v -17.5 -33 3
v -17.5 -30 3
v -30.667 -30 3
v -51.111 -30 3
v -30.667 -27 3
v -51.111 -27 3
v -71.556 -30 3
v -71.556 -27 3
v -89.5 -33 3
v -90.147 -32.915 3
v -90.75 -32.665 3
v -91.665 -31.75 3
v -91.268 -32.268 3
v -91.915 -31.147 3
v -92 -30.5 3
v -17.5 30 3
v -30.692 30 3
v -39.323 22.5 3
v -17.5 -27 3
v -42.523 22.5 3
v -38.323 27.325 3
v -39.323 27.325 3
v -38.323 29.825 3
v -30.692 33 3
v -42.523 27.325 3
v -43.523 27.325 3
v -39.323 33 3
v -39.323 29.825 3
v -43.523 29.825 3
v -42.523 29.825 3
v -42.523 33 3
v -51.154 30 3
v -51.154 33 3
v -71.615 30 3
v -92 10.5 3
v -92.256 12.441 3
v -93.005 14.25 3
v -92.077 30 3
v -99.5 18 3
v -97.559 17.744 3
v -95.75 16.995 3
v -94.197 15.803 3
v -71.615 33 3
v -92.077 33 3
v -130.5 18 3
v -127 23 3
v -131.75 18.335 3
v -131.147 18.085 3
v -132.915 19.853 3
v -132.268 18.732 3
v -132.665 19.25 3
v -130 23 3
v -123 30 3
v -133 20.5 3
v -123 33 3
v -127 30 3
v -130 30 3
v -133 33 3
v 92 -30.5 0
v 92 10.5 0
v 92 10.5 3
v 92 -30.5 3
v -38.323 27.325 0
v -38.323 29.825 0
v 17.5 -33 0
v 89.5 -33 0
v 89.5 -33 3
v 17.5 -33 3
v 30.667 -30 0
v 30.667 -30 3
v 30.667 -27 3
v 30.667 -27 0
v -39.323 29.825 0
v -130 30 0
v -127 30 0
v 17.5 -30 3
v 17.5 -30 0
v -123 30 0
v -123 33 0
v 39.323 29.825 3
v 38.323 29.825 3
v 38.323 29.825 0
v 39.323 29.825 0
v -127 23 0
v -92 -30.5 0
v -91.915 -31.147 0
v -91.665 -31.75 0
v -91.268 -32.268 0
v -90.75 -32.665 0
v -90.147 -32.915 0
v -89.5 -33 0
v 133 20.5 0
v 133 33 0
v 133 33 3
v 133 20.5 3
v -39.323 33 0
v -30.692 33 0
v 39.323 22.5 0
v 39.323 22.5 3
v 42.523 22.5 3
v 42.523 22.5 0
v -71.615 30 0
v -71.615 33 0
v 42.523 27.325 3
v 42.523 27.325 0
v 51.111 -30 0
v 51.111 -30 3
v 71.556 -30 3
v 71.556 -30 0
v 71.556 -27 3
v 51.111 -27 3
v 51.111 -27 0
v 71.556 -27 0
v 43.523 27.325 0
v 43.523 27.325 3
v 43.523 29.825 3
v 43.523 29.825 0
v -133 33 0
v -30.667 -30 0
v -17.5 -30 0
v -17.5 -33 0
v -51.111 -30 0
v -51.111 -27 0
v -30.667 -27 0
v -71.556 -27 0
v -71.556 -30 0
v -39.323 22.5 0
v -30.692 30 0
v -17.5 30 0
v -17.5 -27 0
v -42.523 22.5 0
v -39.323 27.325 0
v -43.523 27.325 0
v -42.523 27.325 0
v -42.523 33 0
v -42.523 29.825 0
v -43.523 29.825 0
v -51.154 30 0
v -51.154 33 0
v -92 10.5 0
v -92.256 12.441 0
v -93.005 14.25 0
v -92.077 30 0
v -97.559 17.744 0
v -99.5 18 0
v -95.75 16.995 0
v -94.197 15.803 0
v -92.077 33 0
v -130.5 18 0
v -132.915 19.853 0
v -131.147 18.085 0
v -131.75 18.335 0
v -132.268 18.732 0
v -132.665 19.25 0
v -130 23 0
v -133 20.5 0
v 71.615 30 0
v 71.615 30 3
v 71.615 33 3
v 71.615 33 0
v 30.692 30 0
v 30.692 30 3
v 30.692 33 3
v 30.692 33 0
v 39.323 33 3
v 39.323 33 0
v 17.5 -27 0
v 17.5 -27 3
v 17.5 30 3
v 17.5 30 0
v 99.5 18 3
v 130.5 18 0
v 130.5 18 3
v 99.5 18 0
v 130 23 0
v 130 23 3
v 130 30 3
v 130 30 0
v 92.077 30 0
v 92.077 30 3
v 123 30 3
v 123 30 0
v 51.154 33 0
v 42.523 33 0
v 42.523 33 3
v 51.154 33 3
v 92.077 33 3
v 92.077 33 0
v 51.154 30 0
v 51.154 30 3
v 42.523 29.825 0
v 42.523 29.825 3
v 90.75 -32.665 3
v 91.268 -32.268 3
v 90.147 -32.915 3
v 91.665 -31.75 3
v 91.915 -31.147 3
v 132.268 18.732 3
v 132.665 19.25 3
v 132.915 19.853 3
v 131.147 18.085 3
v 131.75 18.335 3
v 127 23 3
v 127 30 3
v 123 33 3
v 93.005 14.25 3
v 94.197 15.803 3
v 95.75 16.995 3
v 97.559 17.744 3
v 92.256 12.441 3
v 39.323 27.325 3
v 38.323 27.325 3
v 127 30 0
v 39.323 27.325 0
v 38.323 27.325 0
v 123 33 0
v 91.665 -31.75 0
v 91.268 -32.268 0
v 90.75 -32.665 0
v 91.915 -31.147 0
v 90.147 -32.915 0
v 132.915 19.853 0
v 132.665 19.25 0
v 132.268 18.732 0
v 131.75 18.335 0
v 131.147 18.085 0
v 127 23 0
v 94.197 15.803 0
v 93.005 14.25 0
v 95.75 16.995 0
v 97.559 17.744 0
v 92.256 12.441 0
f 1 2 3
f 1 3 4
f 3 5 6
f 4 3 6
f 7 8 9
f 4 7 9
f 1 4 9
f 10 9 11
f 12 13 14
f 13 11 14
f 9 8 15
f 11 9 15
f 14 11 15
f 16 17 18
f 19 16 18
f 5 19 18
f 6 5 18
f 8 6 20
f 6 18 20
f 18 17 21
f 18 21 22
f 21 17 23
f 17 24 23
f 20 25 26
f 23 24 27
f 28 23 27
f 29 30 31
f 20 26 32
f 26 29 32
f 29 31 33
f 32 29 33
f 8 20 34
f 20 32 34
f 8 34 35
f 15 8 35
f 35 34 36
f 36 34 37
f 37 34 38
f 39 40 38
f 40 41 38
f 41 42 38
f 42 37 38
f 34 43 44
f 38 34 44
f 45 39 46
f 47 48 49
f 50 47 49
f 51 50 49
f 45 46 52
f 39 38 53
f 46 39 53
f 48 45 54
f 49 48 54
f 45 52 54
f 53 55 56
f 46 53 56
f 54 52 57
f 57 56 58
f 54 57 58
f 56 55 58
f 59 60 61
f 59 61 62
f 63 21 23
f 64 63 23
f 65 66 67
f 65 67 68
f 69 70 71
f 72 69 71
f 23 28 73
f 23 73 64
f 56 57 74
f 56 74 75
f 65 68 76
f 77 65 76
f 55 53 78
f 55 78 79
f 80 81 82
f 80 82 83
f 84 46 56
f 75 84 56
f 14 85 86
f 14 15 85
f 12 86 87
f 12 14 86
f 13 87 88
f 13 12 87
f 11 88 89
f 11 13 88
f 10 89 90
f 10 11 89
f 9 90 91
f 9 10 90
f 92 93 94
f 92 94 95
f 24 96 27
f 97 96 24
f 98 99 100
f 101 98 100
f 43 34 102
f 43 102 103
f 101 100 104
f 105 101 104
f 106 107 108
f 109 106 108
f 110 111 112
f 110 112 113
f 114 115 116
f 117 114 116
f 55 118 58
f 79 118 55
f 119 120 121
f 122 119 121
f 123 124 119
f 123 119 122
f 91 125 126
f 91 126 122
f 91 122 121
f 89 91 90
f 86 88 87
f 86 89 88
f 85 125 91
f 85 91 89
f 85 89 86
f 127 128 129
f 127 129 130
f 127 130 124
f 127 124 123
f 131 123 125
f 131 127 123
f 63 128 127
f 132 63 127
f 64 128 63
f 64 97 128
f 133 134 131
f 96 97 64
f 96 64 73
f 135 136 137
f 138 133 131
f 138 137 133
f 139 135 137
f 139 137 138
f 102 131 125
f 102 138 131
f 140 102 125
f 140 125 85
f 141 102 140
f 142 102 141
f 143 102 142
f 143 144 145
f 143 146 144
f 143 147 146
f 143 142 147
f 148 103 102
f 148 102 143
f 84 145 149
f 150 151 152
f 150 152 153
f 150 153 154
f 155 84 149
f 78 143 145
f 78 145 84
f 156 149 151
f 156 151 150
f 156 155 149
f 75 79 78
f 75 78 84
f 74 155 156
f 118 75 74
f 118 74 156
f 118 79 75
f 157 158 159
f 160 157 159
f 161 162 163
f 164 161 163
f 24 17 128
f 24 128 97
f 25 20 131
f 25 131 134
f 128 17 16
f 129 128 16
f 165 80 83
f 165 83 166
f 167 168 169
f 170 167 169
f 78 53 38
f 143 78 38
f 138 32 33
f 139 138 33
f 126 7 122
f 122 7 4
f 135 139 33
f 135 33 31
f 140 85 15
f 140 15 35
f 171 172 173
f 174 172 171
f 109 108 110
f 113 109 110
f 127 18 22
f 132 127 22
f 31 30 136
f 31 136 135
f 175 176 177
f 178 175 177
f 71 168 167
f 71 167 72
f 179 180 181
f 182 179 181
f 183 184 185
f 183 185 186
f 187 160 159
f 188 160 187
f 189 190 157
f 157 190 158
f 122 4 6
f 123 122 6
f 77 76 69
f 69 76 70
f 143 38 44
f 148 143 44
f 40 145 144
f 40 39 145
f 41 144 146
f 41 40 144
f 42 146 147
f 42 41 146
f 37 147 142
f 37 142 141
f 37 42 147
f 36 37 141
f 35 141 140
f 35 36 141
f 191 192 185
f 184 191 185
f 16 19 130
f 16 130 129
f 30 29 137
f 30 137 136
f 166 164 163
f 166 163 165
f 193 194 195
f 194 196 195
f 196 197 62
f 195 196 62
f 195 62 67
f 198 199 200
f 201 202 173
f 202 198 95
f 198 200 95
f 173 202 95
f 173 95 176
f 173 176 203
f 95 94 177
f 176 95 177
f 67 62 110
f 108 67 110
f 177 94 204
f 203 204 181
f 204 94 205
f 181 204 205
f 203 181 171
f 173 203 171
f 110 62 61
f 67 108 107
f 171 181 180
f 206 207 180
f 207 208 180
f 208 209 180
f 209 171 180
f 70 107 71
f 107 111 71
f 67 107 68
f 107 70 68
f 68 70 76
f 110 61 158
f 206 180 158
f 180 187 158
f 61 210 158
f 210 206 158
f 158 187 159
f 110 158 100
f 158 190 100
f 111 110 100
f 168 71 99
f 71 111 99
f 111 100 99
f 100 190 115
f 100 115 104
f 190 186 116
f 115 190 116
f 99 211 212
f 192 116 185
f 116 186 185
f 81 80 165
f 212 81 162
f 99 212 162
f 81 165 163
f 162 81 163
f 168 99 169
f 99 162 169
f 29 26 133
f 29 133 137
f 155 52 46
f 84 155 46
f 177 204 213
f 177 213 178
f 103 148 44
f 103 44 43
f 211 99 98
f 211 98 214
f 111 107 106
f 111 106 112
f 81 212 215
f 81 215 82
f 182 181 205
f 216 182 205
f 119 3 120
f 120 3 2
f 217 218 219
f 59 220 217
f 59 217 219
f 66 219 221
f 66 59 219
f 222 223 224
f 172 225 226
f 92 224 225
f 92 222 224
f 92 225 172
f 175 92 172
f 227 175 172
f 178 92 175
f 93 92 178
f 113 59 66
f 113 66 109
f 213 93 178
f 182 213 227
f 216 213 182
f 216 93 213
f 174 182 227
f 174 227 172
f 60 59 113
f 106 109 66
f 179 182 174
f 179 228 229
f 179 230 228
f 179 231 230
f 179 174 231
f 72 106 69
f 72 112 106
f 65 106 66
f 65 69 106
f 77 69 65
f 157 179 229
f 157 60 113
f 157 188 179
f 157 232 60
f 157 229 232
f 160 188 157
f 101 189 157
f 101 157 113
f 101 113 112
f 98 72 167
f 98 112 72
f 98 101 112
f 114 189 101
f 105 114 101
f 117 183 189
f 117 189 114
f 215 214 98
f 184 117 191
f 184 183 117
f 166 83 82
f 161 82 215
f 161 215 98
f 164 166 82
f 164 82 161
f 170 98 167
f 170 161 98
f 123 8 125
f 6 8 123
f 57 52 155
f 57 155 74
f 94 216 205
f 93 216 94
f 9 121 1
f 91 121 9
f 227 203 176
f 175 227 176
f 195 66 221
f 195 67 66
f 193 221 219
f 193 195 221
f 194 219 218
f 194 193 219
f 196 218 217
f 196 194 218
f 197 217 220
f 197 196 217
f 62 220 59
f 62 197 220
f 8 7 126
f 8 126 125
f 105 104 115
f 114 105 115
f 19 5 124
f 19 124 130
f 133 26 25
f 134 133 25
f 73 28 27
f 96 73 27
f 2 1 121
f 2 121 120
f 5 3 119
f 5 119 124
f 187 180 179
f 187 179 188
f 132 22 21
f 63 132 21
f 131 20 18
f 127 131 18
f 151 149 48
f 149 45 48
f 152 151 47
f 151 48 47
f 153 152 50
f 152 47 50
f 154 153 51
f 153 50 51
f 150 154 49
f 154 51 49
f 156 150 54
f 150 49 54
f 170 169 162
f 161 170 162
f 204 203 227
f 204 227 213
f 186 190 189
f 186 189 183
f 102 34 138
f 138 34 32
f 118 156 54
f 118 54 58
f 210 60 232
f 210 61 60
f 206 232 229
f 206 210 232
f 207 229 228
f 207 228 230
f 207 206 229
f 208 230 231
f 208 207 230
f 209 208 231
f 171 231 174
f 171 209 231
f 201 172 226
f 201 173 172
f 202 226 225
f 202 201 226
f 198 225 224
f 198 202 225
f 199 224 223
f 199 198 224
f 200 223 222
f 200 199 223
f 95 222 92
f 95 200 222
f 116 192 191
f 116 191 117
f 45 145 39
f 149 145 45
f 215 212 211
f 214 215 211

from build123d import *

# Parameters (mm, degrees)
BOSS_EXTRUDE1_DEPTH     = 3
SKETCH3_W               = 3
SKETCH3_H               = 7
SKETCH3_W_2             = 10.461538462
SKETCH3_H_2             = 3
SKETCH3_W_3             = 20.461538461
SKETCH3_W_4             = 20.444444445
CUT_EXTRUDE1_DEPTH      = 1
CUT_EXTRUDE1_DEPTH_BACK = 4
FILLET1_R               = 7.5
FILLET2_R               = 2.5
SKETCH4_W               = 3.2
SKETCH4_H               = 10.5
SKETCH4_W_2             = 5.2
SKETCH4_H_2             = 2.5
CUT_EXTRUDE2_DEPTH      = 1
CUT_EXTRUDE2_DEPTH_BACK = 4
SKETCH5_W               = 35
SKETCH5_H               = 66
CUT_EXTRUDE3_DEPTH      = 1
CUT_EXTRUDE3_DEPTH_BACK = 4


with BuildPart() as part:
    # Sketch2 → Boss-Extrude1 (new body)
    with BuildSketch(Plane.XY):
        Polygon((-133, 33), (133, 33), (133, 18), (92, 18), (92, -33), (-92, -33), (-92, 18), (-133, 18), align=None)
    extrude(amount=BOSS_EXTRUDE1_DEPTH)

    # Sketch3 → Cut-Extrude1 (cut, two sides)
    with BuildSketch(Plane.XY.offset(3)) as cut_extrude1_sk:
        with Locations((-128.5, 26.5)):
            Rectangle(SKETCH3_W, SKETCH3_H)
        with Locations((-117.769230769, 31.5)):
            Rectangle(SKETCH3_W_2, SKETCH3_H_2)
        with Locations((-102.307692308, 31.5)):
            Rectangle(SKETCH3_W_3, SKETCH3_H_2)
        with Locations((-61.384615385, 31.5)):
            Rectangle(SKETCH3_W_3, SKETCH3_H_2)
        with Locations((-20.461538462, 31.5)):
            Rectangle(SKETCH3_W_3, SKETCH3_H_2)
        with Locations((20.461538462, 31.5)):
            Rectangle(SKETCH3_W_3, SKETCH3_H_2)
        with Locations((61.384615385, 31.5)):
            Rectangle(SKETCH3_W_3, SKETCH3_H_2)
        with Locations((102.307692308, 31.5)):
            Rectangle(SKETCH3_W_3, SKETCH3_H_2)
        with Locations((117.769230769, 31.5)):
            Rectangle(SKETCH3_W_2, SKETCH3_H_2)
        with Locations((128.5, 26.5)):
            Rectangle(SKETCH3_W, SKETCH3_H)
        with Locations((-61.333333334, -28.5)):
            Rectangle(SKETCH3_W_4, SKETCH3_H_2)
        with Locations((-20.444444445, -28.5)):
            Rectangle(SKETCH3_W_4, SKETCH3_H_2)
        with Locations((20.444444445, -28.5)):
            Rectangle(SKETCH3_W_4, SKETCH3_H_2)
        with Locations((61.333333334, -28.5)):
            Rectangle(SKETCH3_W_4, SKETCH3_H_2)
    extrude(amount=CUT_EXTRUDE1_DEPTH, mode=Mode.SUBTRACT)
    extrude(cut_extrude1_sk.sketch, amount=-CUT_EXTRUDE1_DEPTH_BACK, mode=Mode.SUBTRACT)

    # Fillet1
    fillet1_edges = [part.edges().sort_by_distance(p)[0] for p in [
        (92, 18, 1.5),
        (-92, 18, 1.5),
    ]]
    fillet(fillet1_edges, radius=FILLET1_R)

    # Fillet2
    fillet2_edges = [part.edges().sort_by_distance(p)[0] for p in [
        (133, 18, 1.5),
        (92, -33, 1.5),
        (-92, -33, 1.5),
        (-133, 18, 1.5),
    ]]
    fillet(fillet2_edges, radius=FILLET2_R)

    # Sketch4 → Cut-Extrude2 (cut, two sides)
    with BuildSketch(Plane.XY.offset(3)) as cut_extrude2_sk:
        with Locations((-40.923076923, 27.75)):
            Rectangle(SKETCH4_W, SKETCH4_H)
        with Locations((40.923076923, 27.75)):
            Rectangle(SKETCH4_W, SKETCH4_H)
        with Locations((40.923076923, 28.575)):
            Rectangle(SKETCH4_W_2, SKETCH4_H_2)
        with Locations((-40.923076923, 28.575)):
            Rectangle(SKETCH4_W_2, SKETCH4_H_2)
    extrude(amount=CUT_EXTRUDE2_DEPTH, mode=Mode.SUBTRACT)
    extrude(cut_extrude2_sk.sketch, amount=-CUT_EXTRUDE2_DEPTH_BACK, mode=Mode.SUBTRACT)

    # Sketch5 → Cut-Extrude3 (cut, two sides)
    with BuildSketch(Plane.XY.offset(3)) as cut_extrude3_sk:
        Rectangle(SKETCH5_W, SKETCH5_H)
    extrude(amount=CUT_EXTRUDE3_DEPTH, mode=Mode.SUBTRACT)
    extrude(cut_extrude3_sk.sketch, amount=-CUT_EXTRUDE3_DEPTH_BACK, mode=Mode.SUBTRACT)


solid = part.part
